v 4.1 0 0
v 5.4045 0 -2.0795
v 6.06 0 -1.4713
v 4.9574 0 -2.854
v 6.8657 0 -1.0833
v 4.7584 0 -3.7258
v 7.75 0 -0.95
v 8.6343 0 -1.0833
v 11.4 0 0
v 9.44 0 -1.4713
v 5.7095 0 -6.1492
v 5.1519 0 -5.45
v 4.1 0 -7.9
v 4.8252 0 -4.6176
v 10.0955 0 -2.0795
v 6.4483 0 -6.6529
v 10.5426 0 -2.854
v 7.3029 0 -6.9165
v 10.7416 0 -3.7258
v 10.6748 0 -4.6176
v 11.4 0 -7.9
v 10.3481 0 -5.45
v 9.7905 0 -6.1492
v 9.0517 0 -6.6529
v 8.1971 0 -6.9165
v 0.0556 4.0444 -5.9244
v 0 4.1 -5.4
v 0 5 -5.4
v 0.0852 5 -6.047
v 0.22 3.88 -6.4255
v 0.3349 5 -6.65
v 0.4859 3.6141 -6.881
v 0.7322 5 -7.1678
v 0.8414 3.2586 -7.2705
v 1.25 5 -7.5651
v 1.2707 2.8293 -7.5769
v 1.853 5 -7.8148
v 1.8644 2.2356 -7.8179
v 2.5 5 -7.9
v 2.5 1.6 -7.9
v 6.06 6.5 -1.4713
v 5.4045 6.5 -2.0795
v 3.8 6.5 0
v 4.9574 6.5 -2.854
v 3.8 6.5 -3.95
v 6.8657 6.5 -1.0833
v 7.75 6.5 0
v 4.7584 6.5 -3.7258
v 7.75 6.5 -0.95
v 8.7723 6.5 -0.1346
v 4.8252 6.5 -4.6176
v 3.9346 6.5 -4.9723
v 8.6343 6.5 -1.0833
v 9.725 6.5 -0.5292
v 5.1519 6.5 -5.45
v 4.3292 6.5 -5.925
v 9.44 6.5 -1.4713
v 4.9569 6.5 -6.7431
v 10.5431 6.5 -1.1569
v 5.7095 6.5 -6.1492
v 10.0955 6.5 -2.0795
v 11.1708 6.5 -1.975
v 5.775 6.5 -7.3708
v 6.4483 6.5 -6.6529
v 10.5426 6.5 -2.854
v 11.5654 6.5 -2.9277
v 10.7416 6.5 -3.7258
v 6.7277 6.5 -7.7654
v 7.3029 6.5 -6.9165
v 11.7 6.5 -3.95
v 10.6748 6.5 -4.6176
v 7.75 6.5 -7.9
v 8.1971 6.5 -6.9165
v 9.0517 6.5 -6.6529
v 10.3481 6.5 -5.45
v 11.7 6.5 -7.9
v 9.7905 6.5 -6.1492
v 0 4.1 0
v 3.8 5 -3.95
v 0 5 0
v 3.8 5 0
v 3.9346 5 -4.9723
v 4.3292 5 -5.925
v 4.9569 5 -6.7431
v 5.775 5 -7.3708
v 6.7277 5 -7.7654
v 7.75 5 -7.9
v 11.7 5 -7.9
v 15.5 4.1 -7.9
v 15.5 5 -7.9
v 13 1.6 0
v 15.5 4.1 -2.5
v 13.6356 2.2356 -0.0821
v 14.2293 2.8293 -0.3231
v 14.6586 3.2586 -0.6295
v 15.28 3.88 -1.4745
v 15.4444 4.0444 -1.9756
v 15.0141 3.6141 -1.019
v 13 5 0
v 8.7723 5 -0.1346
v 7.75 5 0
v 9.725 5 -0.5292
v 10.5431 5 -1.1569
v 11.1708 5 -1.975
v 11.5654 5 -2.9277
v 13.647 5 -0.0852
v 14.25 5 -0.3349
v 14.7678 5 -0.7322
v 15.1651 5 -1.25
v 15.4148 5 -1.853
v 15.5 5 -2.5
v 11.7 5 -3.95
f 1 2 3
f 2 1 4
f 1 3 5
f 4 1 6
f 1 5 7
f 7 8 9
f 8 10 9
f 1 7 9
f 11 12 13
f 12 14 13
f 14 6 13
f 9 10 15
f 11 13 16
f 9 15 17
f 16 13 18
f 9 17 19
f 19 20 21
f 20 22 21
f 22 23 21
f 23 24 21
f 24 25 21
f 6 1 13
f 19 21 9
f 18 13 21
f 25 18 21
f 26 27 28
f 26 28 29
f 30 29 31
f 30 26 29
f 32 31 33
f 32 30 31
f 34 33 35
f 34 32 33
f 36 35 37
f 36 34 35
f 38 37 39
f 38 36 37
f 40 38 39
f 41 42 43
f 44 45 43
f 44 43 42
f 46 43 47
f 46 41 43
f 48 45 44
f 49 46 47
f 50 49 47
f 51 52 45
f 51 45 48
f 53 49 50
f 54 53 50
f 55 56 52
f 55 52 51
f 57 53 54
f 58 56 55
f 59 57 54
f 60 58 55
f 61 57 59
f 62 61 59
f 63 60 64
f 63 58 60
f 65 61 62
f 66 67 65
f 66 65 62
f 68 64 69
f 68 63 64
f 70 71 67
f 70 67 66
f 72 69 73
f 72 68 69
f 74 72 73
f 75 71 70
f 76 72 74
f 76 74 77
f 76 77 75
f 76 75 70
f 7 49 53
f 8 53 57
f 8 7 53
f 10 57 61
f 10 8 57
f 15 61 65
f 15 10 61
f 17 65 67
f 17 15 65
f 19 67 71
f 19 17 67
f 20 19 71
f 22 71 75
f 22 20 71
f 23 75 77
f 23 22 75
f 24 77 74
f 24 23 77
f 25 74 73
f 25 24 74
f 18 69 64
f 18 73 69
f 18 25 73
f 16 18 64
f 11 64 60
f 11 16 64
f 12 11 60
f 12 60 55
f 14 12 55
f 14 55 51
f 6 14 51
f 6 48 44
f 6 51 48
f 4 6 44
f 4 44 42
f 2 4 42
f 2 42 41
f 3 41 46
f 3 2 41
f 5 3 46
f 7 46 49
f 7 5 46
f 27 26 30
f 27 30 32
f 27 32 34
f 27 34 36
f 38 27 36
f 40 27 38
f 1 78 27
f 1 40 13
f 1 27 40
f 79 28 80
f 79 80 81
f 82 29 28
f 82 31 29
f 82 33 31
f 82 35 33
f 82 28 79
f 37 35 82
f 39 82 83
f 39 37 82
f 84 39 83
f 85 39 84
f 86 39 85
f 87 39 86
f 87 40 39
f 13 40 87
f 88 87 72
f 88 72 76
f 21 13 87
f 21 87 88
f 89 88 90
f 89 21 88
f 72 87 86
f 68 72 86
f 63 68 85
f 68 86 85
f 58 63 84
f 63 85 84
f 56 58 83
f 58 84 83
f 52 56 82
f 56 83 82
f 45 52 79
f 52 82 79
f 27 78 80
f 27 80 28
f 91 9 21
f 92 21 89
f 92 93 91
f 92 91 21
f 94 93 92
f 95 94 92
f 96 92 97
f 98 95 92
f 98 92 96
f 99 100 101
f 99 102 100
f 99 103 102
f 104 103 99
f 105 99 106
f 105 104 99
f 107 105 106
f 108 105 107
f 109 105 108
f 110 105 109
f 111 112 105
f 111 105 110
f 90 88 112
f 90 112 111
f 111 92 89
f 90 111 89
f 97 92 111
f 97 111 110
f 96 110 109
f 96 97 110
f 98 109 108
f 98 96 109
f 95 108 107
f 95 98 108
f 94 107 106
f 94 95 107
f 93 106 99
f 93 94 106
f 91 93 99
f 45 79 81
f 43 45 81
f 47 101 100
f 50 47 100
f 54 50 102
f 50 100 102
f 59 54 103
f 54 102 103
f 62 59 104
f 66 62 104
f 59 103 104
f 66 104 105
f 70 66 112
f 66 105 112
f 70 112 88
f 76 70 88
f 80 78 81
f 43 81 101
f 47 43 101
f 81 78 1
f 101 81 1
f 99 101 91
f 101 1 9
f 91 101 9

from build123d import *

# Parameters (mm, degrees)
SKETCH_1_W          = 15.5
SKETCH_1_H          = 7.9
EXTRUDE_1_DEPTH     = 5
EXTRUDE_START       = 5
EXTRUDE_2_DEPTH     = 1.5
CUT_EXTRUDE_2_DEPTH = 19.571752744
CUT_EXTRUDE_3_REACH = 20.572
SKETCH_2_5_R        = 3
CUT_EXTRUDE_4_DEPTH = 19.571752744


with BuildPart() as part:
    # 草图1 → 凸台-拉伸1 (new body)
    with BuildSketch(Plane(origin=(0, 0, 0), x_dir=(1, 0, 0), z_dir=(0, 1, 0))):
        with Locations((7.75, 3.95)):
            Rectangle(SKETCH_1_W, SKETCH_1_H)
    extrude(amount=EXTRUDE_1_DEPTH)

    # 草图2 → 凸台-拉伸2 (add)
    with BuildSketch(Plane(origin=(0, 0, 0), x_dir=(1, 0, 0), z_dir=(0, 1, 0)).offset(EXTRUDE_START)):
        with BuildLine():
            Line((3.8, 3.95), (3.8, 0))
            Line((3.8, 0), (7.75, 0))
            ThreePointArc((7.75, 0), (10.543071786, 1.156928214), (11.7, 3.95))
            Line((11.7, 3.95), (11.7, 7.9))
            Line((11.7, 7.9), (7.75, 7.9))
            ThreePointArc((7.75, 7.9), (4.956928214, 6.743071786), (3.8, 3.95))
        make_face()
    extrude(amount=EXTRUDE_2_DEPTH)

    # 草图3 → 切除-拉伸2 (cut, through all)
    with BuildSketch(Plane.XY):
        Polygon((0, 4.1), (4.1, 0), (0, 0), align=None)
        Polygon((11.4, 0), (15.5, 4.1), (15.5, 0), align=None)
    extrude(amount=-CUT_EXTRUDE_2_DEPTH, mode=Mode.SUBTRACT)

    # 草图4 → 切除-拉伸3 (cut, up to next)
    with BuildSketch(Plane(origin=(0, 0, 0), x_dir=(1, 0, 0), z_dir=(0, 1, 0)), mode=Mode.PRIVATE) as cut_extrude_3_sk1:
        with BuildLine():
            Line((2.5, 7.9), (0, 7.9))
            Line((0, 7.9), (0, 5.4))
            ThreePointArc((0, 5.4), (0.732233047, 7.167766953), (2.5, 7.9))
        make_face()
    cut_extrude_3_tool1 = extrude(cut_extrude_3_sk1.sketch, amount=CUT_EXTRUDE_3_REACH, mode=Mode.PRIVATE) & part.part
    # 草图4 → 切除-拉伸3 (cut, up to next)
    with BuildSketch(Plane(origin=(0, 0, 0), x_dir=(1, 0, 0), z_dir=(0, 1, 0)), mode=Mode.PRIVATE) as cut_extrude_3_sk2:
        with BuildLine():
            Line((13, 0), (15.5, 0))
            Line((15.5, 0), (15.5, 2.5))
            ThreePointArc((15.5, 2.5), (14.767766953, 0.732233047), (13, 0))
        make_face()
    cut_extrude_3_tool2 = extrude(cut_extrude_3_sk2.sketch, amount=CUT_EXTRUDE_3_REACH, mode=Mode.PRIVATE) & part.part
    add(cut_extrude_3_tool1.solids().sort_by_distance((0.55842, 0, -7.34158))[0], mode=Mode.SUBTRACT)
    add(cut_extrude_3_tool2.solids().sort_by_distance((14.94158, 0, -0.55842))[0], mode=Mode.SUBTRACT)

    # 草图2<5> → 切除-拉伸4 (cut, through all)
    with BuildSketch(Plane(origin=(0, 0, 0), x_dir=(1, 0, 0), z_dir=(0, 1, 0))):
        with Locations(Location((7.75, 3.95, 0), (0, 0, 270))):
            Circle(SKETCH_2_5_R)
    extrude(amount=CUT_EXTRUDE_4_DEPTH, mode=Mode.SUBTRACT)


solid = part.part
